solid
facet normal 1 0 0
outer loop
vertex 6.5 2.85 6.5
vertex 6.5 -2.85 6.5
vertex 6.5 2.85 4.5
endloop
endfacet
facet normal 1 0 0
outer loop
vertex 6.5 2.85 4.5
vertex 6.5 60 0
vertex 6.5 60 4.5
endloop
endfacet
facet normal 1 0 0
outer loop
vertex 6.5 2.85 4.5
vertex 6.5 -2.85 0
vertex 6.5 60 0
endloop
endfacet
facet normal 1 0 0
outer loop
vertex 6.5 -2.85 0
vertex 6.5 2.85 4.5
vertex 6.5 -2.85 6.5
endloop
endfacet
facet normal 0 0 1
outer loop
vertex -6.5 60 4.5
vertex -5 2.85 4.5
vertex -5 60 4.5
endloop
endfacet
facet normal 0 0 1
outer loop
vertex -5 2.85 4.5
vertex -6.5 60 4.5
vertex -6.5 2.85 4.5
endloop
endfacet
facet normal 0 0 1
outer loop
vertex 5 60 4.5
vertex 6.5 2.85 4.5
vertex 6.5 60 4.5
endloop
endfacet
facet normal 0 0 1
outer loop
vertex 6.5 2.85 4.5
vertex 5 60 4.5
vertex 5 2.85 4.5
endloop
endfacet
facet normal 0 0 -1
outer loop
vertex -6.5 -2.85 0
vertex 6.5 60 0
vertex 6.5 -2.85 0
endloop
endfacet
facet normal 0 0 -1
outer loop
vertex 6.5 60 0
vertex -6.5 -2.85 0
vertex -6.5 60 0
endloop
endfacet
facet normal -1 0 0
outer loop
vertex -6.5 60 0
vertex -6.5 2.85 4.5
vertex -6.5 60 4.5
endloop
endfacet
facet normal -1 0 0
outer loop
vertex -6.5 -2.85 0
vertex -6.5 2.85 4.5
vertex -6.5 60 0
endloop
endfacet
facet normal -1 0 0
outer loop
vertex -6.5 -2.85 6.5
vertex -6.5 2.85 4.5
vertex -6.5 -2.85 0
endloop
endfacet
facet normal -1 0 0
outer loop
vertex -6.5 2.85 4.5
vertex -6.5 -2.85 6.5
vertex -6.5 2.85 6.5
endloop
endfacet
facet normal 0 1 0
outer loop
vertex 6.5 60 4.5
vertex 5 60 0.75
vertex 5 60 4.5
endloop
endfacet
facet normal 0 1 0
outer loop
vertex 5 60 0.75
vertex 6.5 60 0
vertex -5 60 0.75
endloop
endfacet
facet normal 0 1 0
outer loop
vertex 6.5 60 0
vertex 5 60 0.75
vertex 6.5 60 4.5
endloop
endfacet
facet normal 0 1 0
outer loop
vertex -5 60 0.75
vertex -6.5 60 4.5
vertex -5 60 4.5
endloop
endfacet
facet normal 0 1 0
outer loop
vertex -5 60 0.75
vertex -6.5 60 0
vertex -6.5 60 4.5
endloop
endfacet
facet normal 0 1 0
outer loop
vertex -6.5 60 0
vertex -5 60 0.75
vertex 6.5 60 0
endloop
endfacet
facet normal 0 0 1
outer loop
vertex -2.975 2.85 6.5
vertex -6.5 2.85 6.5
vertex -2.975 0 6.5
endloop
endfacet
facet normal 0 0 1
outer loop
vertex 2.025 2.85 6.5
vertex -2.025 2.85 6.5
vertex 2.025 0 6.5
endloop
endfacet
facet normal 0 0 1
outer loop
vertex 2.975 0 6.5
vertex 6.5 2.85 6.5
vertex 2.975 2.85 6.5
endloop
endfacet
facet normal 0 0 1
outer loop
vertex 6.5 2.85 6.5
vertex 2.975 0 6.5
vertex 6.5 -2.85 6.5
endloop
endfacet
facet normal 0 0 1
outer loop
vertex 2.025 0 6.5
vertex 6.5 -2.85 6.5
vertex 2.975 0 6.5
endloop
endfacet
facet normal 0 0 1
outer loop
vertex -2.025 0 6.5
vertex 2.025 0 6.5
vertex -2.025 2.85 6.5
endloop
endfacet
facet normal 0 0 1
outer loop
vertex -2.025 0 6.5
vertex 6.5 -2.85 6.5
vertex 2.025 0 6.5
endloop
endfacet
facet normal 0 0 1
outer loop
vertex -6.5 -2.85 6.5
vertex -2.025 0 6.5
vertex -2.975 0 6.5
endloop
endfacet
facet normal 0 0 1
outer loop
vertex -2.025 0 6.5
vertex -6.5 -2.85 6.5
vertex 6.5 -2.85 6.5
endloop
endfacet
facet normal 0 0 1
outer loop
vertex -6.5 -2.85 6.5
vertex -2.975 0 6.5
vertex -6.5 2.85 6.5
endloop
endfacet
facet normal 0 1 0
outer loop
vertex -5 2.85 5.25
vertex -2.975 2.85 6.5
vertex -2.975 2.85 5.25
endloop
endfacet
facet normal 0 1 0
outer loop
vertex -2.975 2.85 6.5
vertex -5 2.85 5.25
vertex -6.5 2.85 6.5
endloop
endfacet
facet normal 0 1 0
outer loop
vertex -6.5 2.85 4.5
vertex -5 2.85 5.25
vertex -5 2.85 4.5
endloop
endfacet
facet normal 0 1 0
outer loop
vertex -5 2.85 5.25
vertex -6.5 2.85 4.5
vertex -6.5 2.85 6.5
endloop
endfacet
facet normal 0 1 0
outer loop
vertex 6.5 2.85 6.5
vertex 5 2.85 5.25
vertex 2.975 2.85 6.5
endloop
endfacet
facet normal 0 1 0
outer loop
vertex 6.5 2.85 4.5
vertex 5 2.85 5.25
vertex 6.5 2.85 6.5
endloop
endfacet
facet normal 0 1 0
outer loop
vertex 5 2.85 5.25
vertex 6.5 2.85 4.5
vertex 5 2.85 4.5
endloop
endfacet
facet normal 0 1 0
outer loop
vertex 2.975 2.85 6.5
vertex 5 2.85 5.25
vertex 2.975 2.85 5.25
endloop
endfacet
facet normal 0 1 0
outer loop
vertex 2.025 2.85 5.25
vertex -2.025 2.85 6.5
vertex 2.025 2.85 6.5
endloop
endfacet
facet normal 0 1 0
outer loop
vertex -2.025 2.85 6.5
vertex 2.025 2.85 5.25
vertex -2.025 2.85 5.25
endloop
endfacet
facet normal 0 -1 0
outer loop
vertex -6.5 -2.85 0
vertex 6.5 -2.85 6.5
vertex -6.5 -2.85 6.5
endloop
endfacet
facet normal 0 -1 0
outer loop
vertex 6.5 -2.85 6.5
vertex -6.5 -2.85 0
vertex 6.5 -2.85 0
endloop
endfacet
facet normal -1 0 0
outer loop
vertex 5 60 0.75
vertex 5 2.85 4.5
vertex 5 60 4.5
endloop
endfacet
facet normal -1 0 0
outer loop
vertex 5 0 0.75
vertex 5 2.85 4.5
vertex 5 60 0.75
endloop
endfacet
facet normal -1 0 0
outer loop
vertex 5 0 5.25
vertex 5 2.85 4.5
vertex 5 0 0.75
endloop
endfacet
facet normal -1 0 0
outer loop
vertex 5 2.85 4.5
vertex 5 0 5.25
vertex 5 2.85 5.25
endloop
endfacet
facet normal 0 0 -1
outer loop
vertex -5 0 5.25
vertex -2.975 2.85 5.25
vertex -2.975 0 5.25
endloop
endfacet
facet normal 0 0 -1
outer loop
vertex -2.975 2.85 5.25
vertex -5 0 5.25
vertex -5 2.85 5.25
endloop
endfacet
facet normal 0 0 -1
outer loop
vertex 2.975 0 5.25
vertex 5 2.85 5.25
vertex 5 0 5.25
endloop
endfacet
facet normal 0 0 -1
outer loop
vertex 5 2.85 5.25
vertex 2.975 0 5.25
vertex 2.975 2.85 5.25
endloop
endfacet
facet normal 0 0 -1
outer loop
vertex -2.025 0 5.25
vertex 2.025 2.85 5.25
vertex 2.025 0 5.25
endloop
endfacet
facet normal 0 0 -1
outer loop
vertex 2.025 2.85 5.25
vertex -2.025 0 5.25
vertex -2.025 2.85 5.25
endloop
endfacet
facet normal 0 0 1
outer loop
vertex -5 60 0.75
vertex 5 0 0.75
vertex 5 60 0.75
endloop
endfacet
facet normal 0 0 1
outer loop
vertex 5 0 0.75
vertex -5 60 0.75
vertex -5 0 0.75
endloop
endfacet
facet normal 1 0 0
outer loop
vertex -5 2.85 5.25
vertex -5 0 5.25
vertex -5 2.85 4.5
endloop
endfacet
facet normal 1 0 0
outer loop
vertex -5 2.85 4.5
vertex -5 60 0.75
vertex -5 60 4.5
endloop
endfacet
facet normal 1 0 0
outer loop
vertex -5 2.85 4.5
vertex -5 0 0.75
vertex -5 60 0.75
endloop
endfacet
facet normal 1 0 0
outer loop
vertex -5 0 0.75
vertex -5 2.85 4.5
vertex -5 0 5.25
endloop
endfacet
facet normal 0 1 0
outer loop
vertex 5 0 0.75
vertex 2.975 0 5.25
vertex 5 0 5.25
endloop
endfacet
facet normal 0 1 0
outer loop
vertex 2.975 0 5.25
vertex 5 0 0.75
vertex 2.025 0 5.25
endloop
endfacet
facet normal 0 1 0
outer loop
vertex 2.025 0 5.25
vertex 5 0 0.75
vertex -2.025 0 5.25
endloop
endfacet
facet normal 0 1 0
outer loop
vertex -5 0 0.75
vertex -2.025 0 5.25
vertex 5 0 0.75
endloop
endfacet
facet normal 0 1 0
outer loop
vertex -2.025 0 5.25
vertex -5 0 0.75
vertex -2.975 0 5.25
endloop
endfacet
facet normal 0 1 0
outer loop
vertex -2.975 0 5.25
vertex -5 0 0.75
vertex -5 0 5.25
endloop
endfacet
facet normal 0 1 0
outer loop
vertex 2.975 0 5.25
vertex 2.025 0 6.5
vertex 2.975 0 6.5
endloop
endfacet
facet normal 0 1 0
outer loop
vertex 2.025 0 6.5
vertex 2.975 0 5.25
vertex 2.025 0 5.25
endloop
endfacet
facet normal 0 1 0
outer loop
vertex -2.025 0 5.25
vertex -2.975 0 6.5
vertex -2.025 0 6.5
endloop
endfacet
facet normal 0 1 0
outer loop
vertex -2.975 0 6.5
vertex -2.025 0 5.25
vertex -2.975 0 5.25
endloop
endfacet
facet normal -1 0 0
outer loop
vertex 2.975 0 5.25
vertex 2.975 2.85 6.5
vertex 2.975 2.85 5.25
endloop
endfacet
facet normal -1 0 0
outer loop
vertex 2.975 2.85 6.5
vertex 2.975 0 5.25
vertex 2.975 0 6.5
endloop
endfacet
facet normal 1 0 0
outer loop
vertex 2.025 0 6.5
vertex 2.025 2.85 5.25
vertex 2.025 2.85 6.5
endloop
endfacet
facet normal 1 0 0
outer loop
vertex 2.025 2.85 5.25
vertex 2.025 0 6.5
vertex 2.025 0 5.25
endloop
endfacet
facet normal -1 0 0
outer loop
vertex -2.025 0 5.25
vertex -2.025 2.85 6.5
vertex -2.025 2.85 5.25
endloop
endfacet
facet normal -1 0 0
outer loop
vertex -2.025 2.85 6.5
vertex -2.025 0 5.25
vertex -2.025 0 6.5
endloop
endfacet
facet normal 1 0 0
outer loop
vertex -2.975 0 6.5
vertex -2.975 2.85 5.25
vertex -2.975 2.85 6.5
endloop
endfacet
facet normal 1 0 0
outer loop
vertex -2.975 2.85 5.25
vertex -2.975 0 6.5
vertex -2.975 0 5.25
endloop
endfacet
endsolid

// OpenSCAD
$fn=8;




ts=1.5; // толщина стенки
tp=1;//диаметр жилы
tpr=1.7;//диаметр провода
dd=0.3;
pin=[0.65+dd,0.65+dd,11.5];
lin=[10,60,3];//ширина, длина, толщина
hs=5+ts;
step=5;

//translate([0, 0,lin.z+knt.y/2]) cube([ts,step,knt.y],true);

all();
module all(){
    difference(){
        union(){
            translate([0,lin.y/2,(ts+lin.z)/2]) cube([lin.x+2*ts,lin.y,lin.z+ts],true);
            translate([0,0,hs/2]) cube([lin.x+2*ts,pin.y*6,hs],true);
        }
        translate([0,lin.y,(ts+lin.z)/2+ts/2]) cube([lin.x,lin.y*2,lin.z+ts],true);
        translate([step/2,pin.y*3,pin.z+ts]) cube([pin.x,pin.y*6,pin.z*2],true);
        translate([-step/2,pin.y*3,pin.z+ts]) cube([pin.x,pin.y*6,pin.z*2],true);
    }
}
